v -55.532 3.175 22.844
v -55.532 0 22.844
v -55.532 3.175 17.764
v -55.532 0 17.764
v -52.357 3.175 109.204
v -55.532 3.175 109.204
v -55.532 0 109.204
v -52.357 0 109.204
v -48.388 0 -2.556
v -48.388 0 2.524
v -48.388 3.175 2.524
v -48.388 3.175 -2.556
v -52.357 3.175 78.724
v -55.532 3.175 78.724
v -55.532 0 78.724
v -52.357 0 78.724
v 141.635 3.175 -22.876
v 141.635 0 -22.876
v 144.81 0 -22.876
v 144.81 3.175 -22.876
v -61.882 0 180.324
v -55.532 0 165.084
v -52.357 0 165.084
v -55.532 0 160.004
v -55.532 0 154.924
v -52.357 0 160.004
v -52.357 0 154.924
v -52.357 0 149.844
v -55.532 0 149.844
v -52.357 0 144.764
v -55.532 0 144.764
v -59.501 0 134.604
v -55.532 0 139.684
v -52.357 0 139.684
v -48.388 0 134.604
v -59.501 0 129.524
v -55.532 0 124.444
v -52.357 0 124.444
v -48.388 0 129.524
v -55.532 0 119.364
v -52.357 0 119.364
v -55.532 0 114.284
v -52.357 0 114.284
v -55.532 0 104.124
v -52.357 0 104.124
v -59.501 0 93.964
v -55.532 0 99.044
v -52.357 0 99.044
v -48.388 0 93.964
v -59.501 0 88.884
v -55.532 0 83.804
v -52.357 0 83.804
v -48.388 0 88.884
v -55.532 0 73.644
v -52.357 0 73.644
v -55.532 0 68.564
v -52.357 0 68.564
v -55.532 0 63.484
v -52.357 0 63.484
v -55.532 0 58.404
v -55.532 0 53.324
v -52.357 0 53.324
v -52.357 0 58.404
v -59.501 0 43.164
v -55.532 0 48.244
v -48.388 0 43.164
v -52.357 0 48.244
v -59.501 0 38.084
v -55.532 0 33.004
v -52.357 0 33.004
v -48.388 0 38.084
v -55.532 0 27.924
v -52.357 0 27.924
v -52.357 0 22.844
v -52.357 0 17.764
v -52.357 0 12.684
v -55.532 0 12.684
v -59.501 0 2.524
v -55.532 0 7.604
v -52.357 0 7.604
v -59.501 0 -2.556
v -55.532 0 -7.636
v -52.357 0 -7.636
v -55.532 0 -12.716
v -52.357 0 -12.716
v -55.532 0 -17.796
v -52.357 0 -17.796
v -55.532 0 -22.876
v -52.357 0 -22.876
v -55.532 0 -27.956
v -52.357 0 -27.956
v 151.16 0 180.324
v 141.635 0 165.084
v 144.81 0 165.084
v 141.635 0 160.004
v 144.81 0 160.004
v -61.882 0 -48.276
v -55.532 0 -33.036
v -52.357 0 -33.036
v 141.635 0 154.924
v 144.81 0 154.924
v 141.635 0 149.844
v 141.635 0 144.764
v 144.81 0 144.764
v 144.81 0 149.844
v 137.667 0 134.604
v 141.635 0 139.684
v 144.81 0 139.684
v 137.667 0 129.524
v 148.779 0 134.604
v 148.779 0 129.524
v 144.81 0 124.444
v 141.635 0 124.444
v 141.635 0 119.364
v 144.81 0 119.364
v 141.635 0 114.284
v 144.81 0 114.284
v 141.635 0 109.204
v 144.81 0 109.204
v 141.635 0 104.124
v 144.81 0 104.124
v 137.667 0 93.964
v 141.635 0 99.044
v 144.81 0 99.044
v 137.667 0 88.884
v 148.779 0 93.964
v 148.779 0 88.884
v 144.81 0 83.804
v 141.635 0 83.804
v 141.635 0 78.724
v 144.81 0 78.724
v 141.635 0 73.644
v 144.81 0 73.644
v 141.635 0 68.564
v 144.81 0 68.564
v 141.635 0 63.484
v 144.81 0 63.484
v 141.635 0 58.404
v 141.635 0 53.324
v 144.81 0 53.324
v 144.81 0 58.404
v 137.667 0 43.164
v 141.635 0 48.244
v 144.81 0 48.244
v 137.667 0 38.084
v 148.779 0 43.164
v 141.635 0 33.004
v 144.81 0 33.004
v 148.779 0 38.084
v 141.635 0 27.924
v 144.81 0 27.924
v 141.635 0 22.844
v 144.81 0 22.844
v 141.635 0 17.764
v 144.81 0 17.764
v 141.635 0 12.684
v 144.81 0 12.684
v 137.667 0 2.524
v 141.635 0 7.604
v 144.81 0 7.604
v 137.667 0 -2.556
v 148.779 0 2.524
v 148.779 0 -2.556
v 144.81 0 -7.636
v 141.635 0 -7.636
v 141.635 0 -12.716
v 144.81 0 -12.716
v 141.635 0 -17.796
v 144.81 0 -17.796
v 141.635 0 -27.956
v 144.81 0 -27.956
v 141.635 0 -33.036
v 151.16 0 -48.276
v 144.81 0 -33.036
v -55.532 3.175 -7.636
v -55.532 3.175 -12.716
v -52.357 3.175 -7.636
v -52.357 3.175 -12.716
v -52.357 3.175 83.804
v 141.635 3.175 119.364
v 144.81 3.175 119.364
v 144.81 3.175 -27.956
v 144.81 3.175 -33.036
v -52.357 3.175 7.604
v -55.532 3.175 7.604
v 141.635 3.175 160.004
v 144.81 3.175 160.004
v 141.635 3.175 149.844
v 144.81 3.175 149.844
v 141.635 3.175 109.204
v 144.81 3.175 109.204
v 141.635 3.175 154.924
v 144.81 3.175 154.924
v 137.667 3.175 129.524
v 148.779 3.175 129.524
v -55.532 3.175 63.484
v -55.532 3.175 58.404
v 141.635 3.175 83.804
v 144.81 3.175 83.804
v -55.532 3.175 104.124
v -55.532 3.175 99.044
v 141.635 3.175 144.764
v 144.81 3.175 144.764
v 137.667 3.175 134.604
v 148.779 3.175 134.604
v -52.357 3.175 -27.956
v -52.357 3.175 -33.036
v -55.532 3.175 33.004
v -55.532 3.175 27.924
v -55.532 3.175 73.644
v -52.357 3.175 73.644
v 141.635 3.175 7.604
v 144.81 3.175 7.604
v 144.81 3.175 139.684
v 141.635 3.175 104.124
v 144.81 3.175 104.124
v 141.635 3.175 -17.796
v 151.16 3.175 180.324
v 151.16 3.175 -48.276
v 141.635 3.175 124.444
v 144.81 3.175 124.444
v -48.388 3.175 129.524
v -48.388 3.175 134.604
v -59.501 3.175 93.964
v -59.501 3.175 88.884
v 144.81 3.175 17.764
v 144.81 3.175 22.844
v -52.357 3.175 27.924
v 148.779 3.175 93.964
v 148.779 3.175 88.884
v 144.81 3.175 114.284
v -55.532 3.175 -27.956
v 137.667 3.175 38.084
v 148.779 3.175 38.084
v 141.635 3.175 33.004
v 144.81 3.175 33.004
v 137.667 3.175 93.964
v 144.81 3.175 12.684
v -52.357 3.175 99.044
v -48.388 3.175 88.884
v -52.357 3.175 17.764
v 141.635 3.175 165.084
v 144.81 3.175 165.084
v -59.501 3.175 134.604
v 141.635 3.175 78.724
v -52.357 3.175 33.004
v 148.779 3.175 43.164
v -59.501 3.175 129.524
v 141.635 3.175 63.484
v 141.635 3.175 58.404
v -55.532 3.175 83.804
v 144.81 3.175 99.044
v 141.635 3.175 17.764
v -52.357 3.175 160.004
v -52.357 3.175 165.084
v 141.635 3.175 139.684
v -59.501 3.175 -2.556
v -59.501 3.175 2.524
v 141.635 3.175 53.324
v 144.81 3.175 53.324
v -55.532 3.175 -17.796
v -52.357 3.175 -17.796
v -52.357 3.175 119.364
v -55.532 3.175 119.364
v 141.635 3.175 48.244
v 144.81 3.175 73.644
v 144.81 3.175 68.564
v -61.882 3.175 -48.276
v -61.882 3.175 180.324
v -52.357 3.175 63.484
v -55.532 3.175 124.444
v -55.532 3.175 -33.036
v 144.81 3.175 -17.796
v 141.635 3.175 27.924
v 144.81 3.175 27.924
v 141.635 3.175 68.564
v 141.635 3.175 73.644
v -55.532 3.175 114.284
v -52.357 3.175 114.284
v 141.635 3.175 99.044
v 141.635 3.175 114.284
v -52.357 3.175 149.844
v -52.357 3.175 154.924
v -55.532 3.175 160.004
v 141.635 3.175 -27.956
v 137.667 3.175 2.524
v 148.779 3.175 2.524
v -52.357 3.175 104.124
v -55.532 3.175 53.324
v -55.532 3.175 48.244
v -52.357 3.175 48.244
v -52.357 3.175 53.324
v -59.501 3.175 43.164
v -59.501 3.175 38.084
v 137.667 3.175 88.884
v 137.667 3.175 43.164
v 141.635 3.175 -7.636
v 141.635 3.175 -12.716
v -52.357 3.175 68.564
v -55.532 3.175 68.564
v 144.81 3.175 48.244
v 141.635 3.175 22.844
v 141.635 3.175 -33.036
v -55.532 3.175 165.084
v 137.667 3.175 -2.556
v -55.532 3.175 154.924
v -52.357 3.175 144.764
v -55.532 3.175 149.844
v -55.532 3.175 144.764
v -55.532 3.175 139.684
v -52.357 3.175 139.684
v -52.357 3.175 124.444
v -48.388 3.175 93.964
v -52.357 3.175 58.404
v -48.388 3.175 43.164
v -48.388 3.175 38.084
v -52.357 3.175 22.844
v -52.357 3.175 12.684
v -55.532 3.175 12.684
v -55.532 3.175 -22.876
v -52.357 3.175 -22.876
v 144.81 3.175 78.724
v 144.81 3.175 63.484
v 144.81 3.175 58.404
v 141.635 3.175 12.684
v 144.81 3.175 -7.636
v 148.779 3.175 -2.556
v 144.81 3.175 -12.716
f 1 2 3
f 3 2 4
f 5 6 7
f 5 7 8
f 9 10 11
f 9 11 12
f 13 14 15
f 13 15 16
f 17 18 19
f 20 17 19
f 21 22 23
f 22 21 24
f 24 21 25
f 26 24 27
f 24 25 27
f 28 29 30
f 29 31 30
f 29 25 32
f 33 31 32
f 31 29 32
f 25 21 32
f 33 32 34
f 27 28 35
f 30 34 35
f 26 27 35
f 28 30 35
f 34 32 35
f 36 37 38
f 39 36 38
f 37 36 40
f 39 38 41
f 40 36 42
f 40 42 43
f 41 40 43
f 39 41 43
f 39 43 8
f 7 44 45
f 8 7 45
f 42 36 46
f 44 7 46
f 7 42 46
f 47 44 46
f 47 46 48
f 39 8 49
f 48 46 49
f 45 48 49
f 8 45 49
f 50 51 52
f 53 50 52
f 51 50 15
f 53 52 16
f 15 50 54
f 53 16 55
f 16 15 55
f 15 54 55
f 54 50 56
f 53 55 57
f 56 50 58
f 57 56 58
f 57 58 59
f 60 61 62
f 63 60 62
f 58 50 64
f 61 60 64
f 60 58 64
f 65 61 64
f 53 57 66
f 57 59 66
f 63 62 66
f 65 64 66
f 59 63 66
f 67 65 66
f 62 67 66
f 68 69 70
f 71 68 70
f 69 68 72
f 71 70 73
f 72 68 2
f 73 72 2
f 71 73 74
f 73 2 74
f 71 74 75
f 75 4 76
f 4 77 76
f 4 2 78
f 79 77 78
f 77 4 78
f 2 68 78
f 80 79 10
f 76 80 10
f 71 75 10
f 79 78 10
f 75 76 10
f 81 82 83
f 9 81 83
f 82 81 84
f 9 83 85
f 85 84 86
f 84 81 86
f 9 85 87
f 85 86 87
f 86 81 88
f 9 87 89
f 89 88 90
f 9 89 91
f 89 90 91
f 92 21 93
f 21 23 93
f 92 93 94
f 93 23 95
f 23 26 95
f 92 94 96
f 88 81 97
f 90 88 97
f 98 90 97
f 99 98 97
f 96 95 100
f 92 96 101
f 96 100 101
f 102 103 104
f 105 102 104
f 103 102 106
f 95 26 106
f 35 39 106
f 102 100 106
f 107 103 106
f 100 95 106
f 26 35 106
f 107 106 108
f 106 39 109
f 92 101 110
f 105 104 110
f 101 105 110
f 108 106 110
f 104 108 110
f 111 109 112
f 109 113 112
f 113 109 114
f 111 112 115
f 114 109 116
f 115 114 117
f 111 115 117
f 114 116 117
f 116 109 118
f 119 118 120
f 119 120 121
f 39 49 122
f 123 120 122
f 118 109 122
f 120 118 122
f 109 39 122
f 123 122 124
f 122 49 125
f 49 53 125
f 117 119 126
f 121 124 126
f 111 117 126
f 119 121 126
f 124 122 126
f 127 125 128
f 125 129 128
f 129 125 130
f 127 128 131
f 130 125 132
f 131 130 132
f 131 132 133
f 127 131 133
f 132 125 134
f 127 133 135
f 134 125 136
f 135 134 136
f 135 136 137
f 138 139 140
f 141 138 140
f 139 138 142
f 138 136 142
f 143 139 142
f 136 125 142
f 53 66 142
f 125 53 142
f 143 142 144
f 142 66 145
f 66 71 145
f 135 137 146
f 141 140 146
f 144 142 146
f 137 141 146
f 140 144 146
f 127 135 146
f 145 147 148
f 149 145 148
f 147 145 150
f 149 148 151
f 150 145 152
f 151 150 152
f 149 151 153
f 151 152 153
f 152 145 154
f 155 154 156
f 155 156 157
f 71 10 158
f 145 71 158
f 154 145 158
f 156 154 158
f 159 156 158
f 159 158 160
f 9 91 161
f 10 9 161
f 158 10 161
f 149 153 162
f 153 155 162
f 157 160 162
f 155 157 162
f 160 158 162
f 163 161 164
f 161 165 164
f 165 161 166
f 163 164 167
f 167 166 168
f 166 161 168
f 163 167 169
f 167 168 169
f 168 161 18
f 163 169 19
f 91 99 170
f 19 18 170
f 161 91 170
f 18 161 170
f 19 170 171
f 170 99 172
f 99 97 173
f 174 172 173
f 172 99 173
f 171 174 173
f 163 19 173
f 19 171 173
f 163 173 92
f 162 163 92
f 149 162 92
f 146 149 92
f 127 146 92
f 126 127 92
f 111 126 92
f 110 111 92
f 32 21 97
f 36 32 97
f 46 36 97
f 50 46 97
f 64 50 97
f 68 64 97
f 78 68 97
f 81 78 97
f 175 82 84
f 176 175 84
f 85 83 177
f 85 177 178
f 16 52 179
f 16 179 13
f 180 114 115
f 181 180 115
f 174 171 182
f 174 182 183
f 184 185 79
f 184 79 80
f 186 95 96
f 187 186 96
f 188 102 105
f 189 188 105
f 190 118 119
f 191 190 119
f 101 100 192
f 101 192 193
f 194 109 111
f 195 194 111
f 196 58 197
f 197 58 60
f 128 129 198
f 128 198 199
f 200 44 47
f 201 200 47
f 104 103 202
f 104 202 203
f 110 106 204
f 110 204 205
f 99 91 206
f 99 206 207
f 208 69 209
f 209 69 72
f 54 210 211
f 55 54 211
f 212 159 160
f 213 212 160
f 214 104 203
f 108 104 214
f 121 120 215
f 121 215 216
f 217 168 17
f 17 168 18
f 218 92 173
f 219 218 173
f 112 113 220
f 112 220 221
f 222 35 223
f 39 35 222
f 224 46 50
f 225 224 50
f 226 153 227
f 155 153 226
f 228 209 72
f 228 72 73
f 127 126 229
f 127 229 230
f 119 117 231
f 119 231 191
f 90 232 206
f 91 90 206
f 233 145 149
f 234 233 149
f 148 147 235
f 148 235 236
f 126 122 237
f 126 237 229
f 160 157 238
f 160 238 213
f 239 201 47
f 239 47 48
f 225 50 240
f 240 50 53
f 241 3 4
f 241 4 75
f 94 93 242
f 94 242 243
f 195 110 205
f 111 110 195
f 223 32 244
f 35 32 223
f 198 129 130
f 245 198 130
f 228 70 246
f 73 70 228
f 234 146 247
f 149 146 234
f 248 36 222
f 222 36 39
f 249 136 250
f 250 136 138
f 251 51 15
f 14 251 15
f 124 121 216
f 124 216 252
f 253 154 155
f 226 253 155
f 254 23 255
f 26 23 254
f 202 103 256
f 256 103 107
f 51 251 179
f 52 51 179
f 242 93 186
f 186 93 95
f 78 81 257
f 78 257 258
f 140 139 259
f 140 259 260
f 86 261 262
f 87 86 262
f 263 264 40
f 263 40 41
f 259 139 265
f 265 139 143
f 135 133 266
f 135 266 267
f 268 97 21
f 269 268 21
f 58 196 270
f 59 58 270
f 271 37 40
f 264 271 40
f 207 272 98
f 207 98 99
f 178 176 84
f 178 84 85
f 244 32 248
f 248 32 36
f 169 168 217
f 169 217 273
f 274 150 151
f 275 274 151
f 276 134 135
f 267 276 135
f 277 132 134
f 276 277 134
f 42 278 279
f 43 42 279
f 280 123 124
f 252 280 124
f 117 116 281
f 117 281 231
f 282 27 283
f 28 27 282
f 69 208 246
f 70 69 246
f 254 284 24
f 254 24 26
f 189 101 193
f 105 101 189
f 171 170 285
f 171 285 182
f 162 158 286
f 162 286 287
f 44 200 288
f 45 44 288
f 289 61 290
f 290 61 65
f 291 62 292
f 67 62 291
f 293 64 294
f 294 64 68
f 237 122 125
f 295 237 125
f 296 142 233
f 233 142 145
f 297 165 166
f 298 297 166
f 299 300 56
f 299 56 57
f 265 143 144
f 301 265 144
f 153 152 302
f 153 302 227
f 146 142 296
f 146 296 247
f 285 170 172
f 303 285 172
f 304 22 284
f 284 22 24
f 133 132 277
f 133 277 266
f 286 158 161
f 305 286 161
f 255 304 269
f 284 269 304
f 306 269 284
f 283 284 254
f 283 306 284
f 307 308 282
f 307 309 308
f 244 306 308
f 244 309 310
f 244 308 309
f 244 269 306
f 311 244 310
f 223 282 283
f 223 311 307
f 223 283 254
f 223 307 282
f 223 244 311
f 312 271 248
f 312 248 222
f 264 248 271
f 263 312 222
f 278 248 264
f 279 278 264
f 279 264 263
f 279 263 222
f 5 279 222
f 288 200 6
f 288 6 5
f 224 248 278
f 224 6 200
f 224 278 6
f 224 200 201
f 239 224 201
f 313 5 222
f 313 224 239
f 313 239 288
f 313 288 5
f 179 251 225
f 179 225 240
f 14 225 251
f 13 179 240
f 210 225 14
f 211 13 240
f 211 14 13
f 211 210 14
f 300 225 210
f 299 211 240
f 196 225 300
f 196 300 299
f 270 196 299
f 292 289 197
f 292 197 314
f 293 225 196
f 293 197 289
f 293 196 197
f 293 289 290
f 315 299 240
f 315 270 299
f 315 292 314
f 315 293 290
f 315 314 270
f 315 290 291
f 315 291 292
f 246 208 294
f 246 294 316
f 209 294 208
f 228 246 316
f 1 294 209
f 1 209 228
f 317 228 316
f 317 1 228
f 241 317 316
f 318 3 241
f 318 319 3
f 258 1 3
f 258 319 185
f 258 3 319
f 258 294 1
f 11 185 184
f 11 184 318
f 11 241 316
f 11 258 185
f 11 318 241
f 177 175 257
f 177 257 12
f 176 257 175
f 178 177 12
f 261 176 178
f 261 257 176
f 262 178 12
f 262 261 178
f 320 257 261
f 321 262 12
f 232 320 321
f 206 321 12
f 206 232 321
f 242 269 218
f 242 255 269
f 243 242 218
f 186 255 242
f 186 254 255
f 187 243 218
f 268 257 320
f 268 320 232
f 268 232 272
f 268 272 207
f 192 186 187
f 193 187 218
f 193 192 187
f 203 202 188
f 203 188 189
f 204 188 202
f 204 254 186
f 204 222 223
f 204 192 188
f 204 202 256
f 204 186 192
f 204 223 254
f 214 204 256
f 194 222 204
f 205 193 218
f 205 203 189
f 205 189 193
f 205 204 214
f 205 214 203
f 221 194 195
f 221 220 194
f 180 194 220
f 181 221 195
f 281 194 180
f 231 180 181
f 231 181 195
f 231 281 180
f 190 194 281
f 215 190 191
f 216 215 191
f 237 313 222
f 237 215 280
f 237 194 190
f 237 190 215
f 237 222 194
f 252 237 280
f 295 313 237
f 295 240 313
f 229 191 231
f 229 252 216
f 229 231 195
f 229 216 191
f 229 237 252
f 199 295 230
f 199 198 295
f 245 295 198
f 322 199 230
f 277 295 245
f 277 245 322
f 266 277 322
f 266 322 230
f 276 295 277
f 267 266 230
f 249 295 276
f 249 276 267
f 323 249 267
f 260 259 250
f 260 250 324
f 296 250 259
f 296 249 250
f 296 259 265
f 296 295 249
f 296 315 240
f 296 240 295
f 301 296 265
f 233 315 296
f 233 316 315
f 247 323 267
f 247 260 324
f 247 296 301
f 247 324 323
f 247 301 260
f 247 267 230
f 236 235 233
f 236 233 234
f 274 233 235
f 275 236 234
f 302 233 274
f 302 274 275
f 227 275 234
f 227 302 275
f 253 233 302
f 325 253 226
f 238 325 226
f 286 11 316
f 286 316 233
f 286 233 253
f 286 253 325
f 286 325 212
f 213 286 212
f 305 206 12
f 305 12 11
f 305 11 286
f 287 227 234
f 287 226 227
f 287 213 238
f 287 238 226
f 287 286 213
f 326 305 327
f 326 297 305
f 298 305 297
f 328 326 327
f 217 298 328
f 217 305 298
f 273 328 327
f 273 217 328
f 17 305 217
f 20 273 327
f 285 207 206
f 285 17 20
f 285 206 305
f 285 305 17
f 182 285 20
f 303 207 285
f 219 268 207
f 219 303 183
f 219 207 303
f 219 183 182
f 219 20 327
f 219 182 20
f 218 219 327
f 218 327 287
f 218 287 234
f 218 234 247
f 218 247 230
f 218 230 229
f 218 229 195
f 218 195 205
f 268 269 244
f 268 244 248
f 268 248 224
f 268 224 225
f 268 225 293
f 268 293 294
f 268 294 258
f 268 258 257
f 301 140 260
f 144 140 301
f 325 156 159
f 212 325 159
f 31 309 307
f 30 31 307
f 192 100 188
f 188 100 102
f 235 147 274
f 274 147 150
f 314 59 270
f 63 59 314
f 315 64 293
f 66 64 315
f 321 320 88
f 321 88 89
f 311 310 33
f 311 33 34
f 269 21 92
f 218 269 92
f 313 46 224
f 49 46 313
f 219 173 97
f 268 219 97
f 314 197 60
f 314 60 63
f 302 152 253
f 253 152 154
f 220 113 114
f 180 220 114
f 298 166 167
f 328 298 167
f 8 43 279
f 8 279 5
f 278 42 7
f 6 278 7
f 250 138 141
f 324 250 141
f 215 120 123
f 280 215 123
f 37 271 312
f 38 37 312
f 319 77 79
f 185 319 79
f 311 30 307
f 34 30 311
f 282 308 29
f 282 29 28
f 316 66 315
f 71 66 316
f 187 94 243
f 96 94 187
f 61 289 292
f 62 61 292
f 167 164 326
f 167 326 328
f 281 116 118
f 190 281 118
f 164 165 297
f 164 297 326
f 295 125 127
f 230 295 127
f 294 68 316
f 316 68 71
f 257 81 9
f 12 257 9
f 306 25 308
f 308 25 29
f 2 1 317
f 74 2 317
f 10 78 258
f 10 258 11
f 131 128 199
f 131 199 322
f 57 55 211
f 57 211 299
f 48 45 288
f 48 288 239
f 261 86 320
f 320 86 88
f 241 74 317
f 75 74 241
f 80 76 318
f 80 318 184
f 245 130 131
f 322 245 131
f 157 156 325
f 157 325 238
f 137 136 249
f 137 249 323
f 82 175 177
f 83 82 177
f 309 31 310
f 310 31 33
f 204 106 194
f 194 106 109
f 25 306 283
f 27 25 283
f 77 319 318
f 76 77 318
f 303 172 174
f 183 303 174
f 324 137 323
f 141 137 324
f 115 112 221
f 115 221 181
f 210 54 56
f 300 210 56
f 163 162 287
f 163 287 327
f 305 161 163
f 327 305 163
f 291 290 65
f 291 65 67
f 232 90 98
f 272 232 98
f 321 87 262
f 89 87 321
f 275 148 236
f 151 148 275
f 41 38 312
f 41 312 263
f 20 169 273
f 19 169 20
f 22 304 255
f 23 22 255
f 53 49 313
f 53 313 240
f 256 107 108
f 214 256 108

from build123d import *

# Parameters (mm, degrees)
SKETCH2_W           = 3.175
SKETCH2_H           = 5.08
SKETCH2_W_2         = 11.1125
BOSS_EXTRUDE1_DEPTH = 3.175


with BuildPart() as part:
    # Sketch2 → Boss-Extrude1 (new body)
    with BuildSketch(Plane(origin=(0, 0, 0), x_dir=(1, 0, 0), z_dir=(0, 1, 0))):
        Polygon((-61.882132175, -180.324220965), (151.160367825, -180.324220965), (151.160367825, -134.604220965), (151.160367825, -129.524220965), (151.160367825, -93.964220965), (151.160367825, -88.884220965), (151.160367825, -43.164220965), (151.160367825, -38.084220965), (151.160367825, -2.524220965), (151.160367825, 2.555779035), (151.160367825, 48.275779035), (-61.882132175, 48.275779035), (-61.882132175, 2.555779035), (-61.882132175, -2.524220965), (-61.882132175, -38.084220965), (-61.882132175, -43.164220965), (-61.882132175, -93.964220965), (-61.882132175, -129.524220965), (-61.882132175, -134.604220965), align=None)
        with Locations((-53.944632175, -162.544220965)):
            Rectangle(SKETCH2_W, SKETCH2_H, mode=Mode.SUBTRACT)
        with Locations((143.222867825, -162.544220965)):
            Rectangle(SKETCH2_W, SKETCH2_H, mode=Mode.SUBTRACT)
        with Locations((-53.944632175, -152.384220965)):
            Rectangle(SKETCH2_W, SKETCH2_H, mode=Mode.SUBTRACT)
        with Locations((-53.944632175, -142.224220965)):
            Rectangle(SKETCH2_W, SKETCH2_H, mode=Mode.SUBTRACT)
        with Locations((-53.944632175, -121.904220965)):
            Rectangle(SKETCH2_W, SKETCH2_H, mode=Mode.SUBTRACT)
        with Locations((-53.944632175, -111.744220965)):
            Rectangle(SKETCH2_W, SKETCH2_H, mode=Mode.SUBTRACT)
        with Locations((-53.944632175, -101.584220965)):
            Rectangle(SKETCH2_W, SKETCH2_H, mode=Mode.SUBTRACT)
        with Locations((-53.944632175, -81.264220965)):
            Rectangle(SKETCH2_W, SKETCH2_H, mode=Mode.SUBTRACT)
        with Locations((-53.944632175, -71.104220965)):
            Rectangle(SKETCH2_W, SKETCH2_H, mode=Mode.SUBTRACT)
        with Locations((-53.944632175, -60.944220965)):
            Rectangle(SKETCH2_W, SKETCH2_H, mode=Mode.SUBTRACT)
        with Locations((-53.944632175, -50.784220965)):
            Rectangle(SKETCH2_W, SKETCH2_H, mode=Mode.SUBTRACT)
        with Locations((-53.944632175, -30.464220965)):
            Rectangle(SKETCH2_W, SKETCH2_H, mode=Mode.SUBTRACT)
        with Locations((-53.944632175, -20.304220965)):
            Rectangle(SKETCH2_W, SKETCH2_H, mode=Mode.SUBTRACT)
        with Locations((-53.944632175, -10.144220965)):
            Rectangle(SKETCH2_W, SKETCH2_H, mode=Mode.SUBTRACT)
        with Locations((-53.944632175, 10.175779035)):
            Rectangle(SKETCH2_W, SKETCH2_H, mode=Mode.SUBTRACT)
        with Locations((-53.944632175, 20.335779035)):
            Rectangle(SKETCH2_W, SKETCH2_H, mode=Mode.SUBTRACT)
        with Locations((-53.944632175, 30.495779035)):
            Rectangle(SKETCH2_W, SKETCH2_H, mode=Mode.SUBTRACT)
        with Locations((143.222867825, 30.495779035)):
            Rectangle(SKETCH2_W, SKETCH2_H, mode=Mode.SUBTRACT)
        with Locations((143.222867825, 20.335779035)):
            Rectangle(SKETCH2_W, SKETCH2_H, mode=Mode.SUBTRACT)
        with Locations((143.222867825, 10.175779035)):
            Rectangle(SKETCH2_W, SKETCH2_H, mode=Mode.SUBTRACT)
        with Locations((143.222867825, 0.015779035)):
            Rectangle(SKETCH2_W_2, SKETCH2_H, mode=Mode.SUBTRACT)
        with Locations((143.222867825, -10.144220965)):
            Rectangle(SKETCH2_W, SKETCH2_H, mode=Mode.SUBTRACT)
        with Locations((143.222867825, -20.304220965)):
            Rectangle(SKETCH2_W, SKETCH2_H, mode=Mode.SUBTRACT)
        with Locations((143.222867825, -30.464220965)):
            Rectangle(SKETCH2_W, SKETCH2_H, mode=Mode.SUBTRACT)
        with Locations((143.222867825, -40.624220965)):
            Rectangle(SKETCH2_W_2, SKETCH2_H, mode=Mode.SUBTRACT)
        with Locations((143.222867825, -91.424220965)):
            Rectangle(SKETCH2_W_2, SKETCH2_H, mode=Mode.SUBTRACT)
        with Locations((143.222867825, -132.064220965)):
            Rectangle(SKETCH2_W_2, SKETCH2_H, mode=Mode.SUBTRACT)
        with Locations((143.222867825, -50.784220965)):
            Rectangle(SKETCH2_W, SKETCH2_H, mode=Mode.SUBTRACT)
        with Locations((143.222867825, -60.944220965)):
            Rectangle(SKETCH2_W, SKETCH2_H, mode=Mode.SUBTRACT)
        with Locations((143.222867825, -71.104220965)):
            Rectangle(SKETCH2_W, SKETCH2_H, mode=Mode.SUBTRACT)
        with Locations((143.222867825, -81.264220965)):
            Rectangle(SKETCH2_W, SKETCH2_H, mode=Mode.SUBTRACT)
        with Locations((-53.944632175, -132.064220965)):
            Rectangle(SKETCH2_W_2, SKETCH2_H, mode=Mode.SUBTRACT)
        with Locations((-53.944632175, -91.424220965)):
            Rectangle(SKETCH2_W_2, SKETCH2_H, mode=Mode.SUBTRACT)
        with Locations((143.222867825, -101.584220965)):
            Rectangle(SKETCH2_W, SKETCH2_H, mode=Mode.SUBTRACT)
        with Locations((143.222867825, -111.744220965)):
            Rectangle(SKETCH2_W, SKETCH2_H, mode=Mode.SUBTRACT)
        with Locations((143.222867825, -121.904220965)):
            Rectangle(SKETCH2_W, SKETCH2_H, mode=Mode.SUBTRACT)
        with Locations((-53.944632175, -40.624220965)):
            Rectangle(SKETCH2_W_2, SKETCH2_H, mode=Mode.SUBTRACT)
        Polygon((-59.500882175, 2.555779035), (-59.500882175, -2.524220965), (-48.388382175, -2.524220965), (-48.388382175, 2.555779035), (-52.357132175, 2.555779035), (-55.532132175, 2.555779035), align=None, mode=Mode.SUBTRACT)
        with Locations((143.222867825, -142.224220965)):
            Rectangle(SKETCH2_W, SKETCH2_H, mode=Mode.SUBTRACT)
        with Locations((143.222867825, -152.384220965)):
            Rectangle(SKETCH2_W, SKETCH2_H, mode=Mode.SUBTRACT)
    extrude(amount=BOSS_EXTRUDE1_DEPTH)


solid = part.part
